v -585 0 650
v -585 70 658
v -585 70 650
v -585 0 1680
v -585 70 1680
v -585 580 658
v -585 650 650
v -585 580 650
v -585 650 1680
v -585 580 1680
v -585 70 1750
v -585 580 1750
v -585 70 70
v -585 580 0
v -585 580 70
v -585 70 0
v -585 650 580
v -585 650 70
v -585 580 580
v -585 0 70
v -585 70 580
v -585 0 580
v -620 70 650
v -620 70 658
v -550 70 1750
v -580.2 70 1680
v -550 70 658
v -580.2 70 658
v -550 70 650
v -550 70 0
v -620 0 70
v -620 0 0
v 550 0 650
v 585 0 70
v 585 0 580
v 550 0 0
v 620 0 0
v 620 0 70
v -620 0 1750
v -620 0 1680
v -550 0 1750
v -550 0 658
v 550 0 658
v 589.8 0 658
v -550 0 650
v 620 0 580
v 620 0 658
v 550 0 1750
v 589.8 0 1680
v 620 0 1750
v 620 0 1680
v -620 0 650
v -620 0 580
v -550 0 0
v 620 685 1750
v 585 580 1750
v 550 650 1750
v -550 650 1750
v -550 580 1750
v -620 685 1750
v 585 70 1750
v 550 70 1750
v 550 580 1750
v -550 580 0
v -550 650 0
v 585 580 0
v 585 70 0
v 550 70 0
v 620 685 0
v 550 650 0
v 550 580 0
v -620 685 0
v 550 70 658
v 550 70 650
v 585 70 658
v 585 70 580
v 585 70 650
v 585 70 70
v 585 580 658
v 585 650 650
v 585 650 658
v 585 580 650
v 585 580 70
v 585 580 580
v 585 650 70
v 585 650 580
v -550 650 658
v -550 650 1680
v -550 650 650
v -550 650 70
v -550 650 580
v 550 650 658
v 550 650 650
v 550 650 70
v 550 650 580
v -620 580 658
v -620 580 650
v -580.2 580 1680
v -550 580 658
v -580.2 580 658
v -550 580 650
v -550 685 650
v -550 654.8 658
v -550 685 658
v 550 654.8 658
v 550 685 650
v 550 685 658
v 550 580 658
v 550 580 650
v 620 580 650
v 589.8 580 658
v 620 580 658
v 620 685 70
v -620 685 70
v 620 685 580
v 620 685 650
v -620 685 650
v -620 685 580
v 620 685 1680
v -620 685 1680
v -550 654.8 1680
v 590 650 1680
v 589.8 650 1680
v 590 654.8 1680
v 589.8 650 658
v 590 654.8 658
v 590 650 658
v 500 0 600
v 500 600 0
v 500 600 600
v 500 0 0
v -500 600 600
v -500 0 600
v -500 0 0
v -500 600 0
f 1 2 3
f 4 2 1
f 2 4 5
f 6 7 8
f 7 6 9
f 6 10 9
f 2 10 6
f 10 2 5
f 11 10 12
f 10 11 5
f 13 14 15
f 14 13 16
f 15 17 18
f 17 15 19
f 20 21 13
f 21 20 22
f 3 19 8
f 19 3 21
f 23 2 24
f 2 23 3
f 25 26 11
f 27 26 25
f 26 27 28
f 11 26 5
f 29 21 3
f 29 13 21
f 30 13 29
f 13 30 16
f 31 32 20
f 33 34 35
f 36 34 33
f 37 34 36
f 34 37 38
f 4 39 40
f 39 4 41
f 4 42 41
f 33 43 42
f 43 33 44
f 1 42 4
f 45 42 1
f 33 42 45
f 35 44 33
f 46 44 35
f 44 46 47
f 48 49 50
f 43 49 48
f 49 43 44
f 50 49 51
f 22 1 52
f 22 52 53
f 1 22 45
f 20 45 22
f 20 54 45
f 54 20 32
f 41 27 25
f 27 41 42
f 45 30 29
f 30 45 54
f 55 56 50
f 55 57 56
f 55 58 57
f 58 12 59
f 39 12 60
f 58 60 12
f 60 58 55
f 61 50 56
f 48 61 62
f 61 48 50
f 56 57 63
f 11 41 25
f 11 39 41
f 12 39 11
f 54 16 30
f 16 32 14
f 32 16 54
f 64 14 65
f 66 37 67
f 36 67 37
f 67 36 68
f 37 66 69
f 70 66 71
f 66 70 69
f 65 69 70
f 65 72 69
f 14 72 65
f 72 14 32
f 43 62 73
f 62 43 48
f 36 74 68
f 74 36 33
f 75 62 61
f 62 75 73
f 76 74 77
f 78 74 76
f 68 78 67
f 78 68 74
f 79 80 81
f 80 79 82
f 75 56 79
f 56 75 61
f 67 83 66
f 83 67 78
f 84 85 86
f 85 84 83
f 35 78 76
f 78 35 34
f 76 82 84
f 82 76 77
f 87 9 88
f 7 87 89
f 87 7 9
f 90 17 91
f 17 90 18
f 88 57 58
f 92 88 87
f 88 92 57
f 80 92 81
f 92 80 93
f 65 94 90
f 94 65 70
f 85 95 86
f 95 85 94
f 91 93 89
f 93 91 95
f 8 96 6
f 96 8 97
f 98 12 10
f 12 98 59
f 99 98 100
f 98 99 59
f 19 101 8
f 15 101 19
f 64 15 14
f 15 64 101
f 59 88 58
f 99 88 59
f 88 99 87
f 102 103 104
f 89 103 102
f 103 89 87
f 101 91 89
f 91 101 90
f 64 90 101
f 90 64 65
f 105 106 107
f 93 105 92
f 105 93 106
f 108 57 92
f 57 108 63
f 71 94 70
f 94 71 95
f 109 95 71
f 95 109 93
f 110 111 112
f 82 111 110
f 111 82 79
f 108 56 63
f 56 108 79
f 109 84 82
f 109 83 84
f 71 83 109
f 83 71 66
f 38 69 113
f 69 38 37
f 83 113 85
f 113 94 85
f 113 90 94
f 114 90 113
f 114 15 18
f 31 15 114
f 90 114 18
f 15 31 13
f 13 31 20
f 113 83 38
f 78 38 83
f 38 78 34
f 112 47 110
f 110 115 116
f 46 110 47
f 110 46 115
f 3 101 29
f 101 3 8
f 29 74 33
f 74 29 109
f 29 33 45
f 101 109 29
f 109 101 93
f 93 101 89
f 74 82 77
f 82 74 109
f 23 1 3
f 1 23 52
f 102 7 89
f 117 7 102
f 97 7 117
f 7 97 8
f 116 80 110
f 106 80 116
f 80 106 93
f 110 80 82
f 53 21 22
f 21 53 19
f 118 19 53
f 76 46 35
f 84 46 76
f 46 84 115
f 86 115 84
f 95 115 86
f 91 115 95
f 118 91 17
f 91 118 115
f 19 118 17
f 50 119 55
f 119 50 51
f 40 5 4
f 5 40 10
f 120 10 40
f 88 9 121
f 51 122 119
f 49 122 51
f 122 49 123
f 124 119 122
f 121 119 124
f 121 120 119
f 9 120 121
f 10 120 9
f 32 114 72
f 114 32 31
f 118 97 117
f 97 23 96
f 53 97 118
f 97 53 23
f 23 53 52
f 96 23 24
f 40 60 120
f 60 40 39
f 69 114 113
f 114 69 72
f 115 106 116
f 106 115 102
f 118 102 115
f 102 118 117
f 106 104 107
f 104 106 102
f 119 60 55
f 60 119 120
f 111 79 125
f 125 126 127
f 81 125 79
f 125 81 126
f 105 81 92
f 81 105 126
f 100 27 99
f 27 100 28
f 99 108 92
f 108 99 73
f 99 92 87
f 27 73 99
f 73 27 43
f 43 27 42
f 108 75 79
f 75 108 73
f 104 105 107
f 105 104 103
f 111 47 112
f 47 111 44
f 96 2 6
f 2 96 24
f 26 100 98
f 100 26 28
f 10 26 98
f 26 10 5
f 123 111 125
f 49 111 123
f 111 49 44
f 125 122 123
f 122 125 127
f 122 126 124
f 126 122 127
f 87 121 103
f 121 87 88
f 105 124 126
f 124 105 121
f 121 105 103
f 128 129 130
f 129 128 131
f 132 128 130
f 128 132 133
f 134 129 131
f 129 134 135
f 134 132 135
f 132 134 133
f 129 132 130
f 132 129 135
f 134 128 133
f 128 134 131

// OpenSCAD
// Lawn Mower
lm_width = 1000;
lm_height = 600;
lm_length = 600;

lm_spacing = 50;

color("red")
translate([-lm_width/2, 0, 0]) {
    cube([lm_width, lm_length, lm_height]);
}

// Whipper Snipper
ws_width = 230;
ws_height = 1700;
ws_length = 230;
ws_spacing = 50;
ws_pu_height = 350; // Complete guess

color("red")
translate([-(ws_width/2), lm_length + lm_spacing + p_width, ws_pu_height + ws_spacing]) {
    //cube([ws_width, ws_length, ws_height]);
}
    
// Pine Dimensions
p_width = 35;
p_depth = 70;

// Shelf
sh_thickness = 8;
sh_width = 4*p_width + 2*lm_spacing + lm_width;
sh_length = lm_length + lm_spacing + p_width;

// Lengths
tallUpright = ws_spacing + ws_height;
shortUpright = lm_height + lm_spacing;
shortBrace = 4*p_width + 2*lm_spacing + lm_width;
longBrace = lm_length+lm_spacing;

// Peg Board
pb_thickness = 4.8;
pb_offset = sh_thickness + shortUpright;
pb_depth = lm_length + lm_spacing;
pb_length = tallUpright - pb_offset-p_depth;
pb_width = 2 * p_depth + lm_width;

// Uprights
color("yellow") {
    translate([-(lm_width/2 + lm_spacing), 0, 0]) {
        rotate([90, 0, 180])
        cube([p_width, tallUpright, p_depth]);
        echo(TallUpright=tallUpright);
    }

    translate([(lm_width/2 + lm_spacing + p_width), 0, 0]) {
        rotate([90, 0, 180])
        cube([p_width, tallUpright, p_depth]);
        echo(TallUpright=tallUpright);
    }
    
    translate([-(lm_width/2 + lm_spacing), lm_length - p_depth + lm_spacing, 0]) {
        rotate([90, 0, 180])
        cube([p_width, tallUpright, p_depth]);
        echo(TallUpright=tallUpright);
    }
    translate([(lm_width/2 + lm_spacing + p_width), lm_length - p_depth + lm_spacing, 0]) {
        rotate([90, 0, 180])
        cube([p_width, tallUpright, p_depth]);
        echo(tallUpright=tallUpright);
    }
}
// Right Side Braces
translate([(lm_width/2 + lm_spacing + p_width), 0, 0]) {
    translate([0, 0, 0]) {
        cube([p_width, longBrace, p_depth]);
        echo(LongBrace=longBrace);
    }

    translate([0, 0, shortUpright - p_depth]) {
        cube([p_width, longBrace, p_depth]);
        echo(LongBrace=longBrace);
    }
    
    translate([0, 0, tallUpright - p_depth]) {
        cube([p_width, longBrace, p_depth]);
        echo(LongBrace=longBrace);
    }
}
// Left Side Braces
translate([-(lm_width/2 + lm_spacing + 2*p_width), 0, 0]) {
    // Bottom
    translate([0, 0, 0]) {
        cube([p_width, longBrace, p_depth]);
        echo(LongBrace=longBrace);
    }

    // Middle
    translate([0, 0, shortUpright - p_depth]) {
        cube([p_width, longBrace, p_depth]);
        echo(LongBrace=longBrace);
    }
    
    // Top
    translate([0, 0, tallUpright - p_depth]) {
        cube([p_width, longBrace, p_depth]);
        echo(LongBrace=longBrace);
    }
}

// Back Braces
color("blue")
translate([(lm_width/2 + lm_spacing + 2*p_width), lm_length + lm_spacing, 0]) {
    // Bottom
    translate([0, 0, 0]) {
        rotate([0, 0, 90]) {
            cube([p_width, shortBrace, p_depth]);
            echo(ShortBrace=shortBrace);
        }
    }
    
    // Middle
    translate([0, 0, shortUpright - p_depth]) {
        rotate([0, 0, 90]) {
            cube([p_width, shortBrace, p_depth]);
            echo(ShortBrace=shortBrace);
        }
    }
    
    // Top
    translate([0, 0, tallUpright-p_depth]) {
        rotate([0, 0, 90]) {
            cube([p_width, shortBrace, p_depth]);
            echo(ShortBrace=shortBrace);
        }
    }
}

// Shelf
color("green")
translate([-(2*p_width + lm_spacing + lm_width/2), 0, shortUpright]) {
    difference() {
        cube([sh_width, sh_length, sh_thickness]);
        
        translate([0, 0, -1]) {
            cube([2*p_width, p_depth, sh_thickness + 2]);
        }
        
        /*
        translate([2*p_width + 2*lm_spacing + lm_width, 0, -1]) {
            cube([2*p_width, p_depth, sh_thickness + 2]);
        }
        */
        
        translate([0, lm_length + lm_spacing - p_depth, -1]) {
            cube([2*p_width, p_depth + p_width, sh_thickness + 2]);
        }
        
        translate([2*p_width + 2*lm_spacing + lm_width, lm_length + lm_spacing - p_depth, -1]) {
            cube([2*p_width, p_depth + p_width, sh_thickness + 2]);
        }
    }
    echo(Shelf_Width=sh_width,Shelf_Length=sh_length);
}
//Peg Board
color("brown")
translate([0, 0, pb_offset]) {
    
    // Left Panel
    translate([-(lm_width/2 + lm_spacing + p_width), 0, 0]) {
        cube([pb_thickness, pb_depth, pb_length]);
        echo(PegBoard_Depth=pb_depth,PegBoard_Length=pb_length);
    }
    
    // Right Panel
    translate([(lm_width/2 + lm_spacing + p_width), 0, 0]) {
        cube([pb_thickness, pb_depth, pb_length]);
        echo(PegBoard_Depth=pb_depth,PegBoard_Length=pb_length);
    }
    
    // Back Panel
    translate([-(lm_width/2 + lm_spacing), lm_length +lm_spacing, 0]) {
        cube([pb_width, pb_thickness, pb_length]);
        echo(PegBoard_Width=pb_width,PegBoard_Length=pb_length);
    }
}
